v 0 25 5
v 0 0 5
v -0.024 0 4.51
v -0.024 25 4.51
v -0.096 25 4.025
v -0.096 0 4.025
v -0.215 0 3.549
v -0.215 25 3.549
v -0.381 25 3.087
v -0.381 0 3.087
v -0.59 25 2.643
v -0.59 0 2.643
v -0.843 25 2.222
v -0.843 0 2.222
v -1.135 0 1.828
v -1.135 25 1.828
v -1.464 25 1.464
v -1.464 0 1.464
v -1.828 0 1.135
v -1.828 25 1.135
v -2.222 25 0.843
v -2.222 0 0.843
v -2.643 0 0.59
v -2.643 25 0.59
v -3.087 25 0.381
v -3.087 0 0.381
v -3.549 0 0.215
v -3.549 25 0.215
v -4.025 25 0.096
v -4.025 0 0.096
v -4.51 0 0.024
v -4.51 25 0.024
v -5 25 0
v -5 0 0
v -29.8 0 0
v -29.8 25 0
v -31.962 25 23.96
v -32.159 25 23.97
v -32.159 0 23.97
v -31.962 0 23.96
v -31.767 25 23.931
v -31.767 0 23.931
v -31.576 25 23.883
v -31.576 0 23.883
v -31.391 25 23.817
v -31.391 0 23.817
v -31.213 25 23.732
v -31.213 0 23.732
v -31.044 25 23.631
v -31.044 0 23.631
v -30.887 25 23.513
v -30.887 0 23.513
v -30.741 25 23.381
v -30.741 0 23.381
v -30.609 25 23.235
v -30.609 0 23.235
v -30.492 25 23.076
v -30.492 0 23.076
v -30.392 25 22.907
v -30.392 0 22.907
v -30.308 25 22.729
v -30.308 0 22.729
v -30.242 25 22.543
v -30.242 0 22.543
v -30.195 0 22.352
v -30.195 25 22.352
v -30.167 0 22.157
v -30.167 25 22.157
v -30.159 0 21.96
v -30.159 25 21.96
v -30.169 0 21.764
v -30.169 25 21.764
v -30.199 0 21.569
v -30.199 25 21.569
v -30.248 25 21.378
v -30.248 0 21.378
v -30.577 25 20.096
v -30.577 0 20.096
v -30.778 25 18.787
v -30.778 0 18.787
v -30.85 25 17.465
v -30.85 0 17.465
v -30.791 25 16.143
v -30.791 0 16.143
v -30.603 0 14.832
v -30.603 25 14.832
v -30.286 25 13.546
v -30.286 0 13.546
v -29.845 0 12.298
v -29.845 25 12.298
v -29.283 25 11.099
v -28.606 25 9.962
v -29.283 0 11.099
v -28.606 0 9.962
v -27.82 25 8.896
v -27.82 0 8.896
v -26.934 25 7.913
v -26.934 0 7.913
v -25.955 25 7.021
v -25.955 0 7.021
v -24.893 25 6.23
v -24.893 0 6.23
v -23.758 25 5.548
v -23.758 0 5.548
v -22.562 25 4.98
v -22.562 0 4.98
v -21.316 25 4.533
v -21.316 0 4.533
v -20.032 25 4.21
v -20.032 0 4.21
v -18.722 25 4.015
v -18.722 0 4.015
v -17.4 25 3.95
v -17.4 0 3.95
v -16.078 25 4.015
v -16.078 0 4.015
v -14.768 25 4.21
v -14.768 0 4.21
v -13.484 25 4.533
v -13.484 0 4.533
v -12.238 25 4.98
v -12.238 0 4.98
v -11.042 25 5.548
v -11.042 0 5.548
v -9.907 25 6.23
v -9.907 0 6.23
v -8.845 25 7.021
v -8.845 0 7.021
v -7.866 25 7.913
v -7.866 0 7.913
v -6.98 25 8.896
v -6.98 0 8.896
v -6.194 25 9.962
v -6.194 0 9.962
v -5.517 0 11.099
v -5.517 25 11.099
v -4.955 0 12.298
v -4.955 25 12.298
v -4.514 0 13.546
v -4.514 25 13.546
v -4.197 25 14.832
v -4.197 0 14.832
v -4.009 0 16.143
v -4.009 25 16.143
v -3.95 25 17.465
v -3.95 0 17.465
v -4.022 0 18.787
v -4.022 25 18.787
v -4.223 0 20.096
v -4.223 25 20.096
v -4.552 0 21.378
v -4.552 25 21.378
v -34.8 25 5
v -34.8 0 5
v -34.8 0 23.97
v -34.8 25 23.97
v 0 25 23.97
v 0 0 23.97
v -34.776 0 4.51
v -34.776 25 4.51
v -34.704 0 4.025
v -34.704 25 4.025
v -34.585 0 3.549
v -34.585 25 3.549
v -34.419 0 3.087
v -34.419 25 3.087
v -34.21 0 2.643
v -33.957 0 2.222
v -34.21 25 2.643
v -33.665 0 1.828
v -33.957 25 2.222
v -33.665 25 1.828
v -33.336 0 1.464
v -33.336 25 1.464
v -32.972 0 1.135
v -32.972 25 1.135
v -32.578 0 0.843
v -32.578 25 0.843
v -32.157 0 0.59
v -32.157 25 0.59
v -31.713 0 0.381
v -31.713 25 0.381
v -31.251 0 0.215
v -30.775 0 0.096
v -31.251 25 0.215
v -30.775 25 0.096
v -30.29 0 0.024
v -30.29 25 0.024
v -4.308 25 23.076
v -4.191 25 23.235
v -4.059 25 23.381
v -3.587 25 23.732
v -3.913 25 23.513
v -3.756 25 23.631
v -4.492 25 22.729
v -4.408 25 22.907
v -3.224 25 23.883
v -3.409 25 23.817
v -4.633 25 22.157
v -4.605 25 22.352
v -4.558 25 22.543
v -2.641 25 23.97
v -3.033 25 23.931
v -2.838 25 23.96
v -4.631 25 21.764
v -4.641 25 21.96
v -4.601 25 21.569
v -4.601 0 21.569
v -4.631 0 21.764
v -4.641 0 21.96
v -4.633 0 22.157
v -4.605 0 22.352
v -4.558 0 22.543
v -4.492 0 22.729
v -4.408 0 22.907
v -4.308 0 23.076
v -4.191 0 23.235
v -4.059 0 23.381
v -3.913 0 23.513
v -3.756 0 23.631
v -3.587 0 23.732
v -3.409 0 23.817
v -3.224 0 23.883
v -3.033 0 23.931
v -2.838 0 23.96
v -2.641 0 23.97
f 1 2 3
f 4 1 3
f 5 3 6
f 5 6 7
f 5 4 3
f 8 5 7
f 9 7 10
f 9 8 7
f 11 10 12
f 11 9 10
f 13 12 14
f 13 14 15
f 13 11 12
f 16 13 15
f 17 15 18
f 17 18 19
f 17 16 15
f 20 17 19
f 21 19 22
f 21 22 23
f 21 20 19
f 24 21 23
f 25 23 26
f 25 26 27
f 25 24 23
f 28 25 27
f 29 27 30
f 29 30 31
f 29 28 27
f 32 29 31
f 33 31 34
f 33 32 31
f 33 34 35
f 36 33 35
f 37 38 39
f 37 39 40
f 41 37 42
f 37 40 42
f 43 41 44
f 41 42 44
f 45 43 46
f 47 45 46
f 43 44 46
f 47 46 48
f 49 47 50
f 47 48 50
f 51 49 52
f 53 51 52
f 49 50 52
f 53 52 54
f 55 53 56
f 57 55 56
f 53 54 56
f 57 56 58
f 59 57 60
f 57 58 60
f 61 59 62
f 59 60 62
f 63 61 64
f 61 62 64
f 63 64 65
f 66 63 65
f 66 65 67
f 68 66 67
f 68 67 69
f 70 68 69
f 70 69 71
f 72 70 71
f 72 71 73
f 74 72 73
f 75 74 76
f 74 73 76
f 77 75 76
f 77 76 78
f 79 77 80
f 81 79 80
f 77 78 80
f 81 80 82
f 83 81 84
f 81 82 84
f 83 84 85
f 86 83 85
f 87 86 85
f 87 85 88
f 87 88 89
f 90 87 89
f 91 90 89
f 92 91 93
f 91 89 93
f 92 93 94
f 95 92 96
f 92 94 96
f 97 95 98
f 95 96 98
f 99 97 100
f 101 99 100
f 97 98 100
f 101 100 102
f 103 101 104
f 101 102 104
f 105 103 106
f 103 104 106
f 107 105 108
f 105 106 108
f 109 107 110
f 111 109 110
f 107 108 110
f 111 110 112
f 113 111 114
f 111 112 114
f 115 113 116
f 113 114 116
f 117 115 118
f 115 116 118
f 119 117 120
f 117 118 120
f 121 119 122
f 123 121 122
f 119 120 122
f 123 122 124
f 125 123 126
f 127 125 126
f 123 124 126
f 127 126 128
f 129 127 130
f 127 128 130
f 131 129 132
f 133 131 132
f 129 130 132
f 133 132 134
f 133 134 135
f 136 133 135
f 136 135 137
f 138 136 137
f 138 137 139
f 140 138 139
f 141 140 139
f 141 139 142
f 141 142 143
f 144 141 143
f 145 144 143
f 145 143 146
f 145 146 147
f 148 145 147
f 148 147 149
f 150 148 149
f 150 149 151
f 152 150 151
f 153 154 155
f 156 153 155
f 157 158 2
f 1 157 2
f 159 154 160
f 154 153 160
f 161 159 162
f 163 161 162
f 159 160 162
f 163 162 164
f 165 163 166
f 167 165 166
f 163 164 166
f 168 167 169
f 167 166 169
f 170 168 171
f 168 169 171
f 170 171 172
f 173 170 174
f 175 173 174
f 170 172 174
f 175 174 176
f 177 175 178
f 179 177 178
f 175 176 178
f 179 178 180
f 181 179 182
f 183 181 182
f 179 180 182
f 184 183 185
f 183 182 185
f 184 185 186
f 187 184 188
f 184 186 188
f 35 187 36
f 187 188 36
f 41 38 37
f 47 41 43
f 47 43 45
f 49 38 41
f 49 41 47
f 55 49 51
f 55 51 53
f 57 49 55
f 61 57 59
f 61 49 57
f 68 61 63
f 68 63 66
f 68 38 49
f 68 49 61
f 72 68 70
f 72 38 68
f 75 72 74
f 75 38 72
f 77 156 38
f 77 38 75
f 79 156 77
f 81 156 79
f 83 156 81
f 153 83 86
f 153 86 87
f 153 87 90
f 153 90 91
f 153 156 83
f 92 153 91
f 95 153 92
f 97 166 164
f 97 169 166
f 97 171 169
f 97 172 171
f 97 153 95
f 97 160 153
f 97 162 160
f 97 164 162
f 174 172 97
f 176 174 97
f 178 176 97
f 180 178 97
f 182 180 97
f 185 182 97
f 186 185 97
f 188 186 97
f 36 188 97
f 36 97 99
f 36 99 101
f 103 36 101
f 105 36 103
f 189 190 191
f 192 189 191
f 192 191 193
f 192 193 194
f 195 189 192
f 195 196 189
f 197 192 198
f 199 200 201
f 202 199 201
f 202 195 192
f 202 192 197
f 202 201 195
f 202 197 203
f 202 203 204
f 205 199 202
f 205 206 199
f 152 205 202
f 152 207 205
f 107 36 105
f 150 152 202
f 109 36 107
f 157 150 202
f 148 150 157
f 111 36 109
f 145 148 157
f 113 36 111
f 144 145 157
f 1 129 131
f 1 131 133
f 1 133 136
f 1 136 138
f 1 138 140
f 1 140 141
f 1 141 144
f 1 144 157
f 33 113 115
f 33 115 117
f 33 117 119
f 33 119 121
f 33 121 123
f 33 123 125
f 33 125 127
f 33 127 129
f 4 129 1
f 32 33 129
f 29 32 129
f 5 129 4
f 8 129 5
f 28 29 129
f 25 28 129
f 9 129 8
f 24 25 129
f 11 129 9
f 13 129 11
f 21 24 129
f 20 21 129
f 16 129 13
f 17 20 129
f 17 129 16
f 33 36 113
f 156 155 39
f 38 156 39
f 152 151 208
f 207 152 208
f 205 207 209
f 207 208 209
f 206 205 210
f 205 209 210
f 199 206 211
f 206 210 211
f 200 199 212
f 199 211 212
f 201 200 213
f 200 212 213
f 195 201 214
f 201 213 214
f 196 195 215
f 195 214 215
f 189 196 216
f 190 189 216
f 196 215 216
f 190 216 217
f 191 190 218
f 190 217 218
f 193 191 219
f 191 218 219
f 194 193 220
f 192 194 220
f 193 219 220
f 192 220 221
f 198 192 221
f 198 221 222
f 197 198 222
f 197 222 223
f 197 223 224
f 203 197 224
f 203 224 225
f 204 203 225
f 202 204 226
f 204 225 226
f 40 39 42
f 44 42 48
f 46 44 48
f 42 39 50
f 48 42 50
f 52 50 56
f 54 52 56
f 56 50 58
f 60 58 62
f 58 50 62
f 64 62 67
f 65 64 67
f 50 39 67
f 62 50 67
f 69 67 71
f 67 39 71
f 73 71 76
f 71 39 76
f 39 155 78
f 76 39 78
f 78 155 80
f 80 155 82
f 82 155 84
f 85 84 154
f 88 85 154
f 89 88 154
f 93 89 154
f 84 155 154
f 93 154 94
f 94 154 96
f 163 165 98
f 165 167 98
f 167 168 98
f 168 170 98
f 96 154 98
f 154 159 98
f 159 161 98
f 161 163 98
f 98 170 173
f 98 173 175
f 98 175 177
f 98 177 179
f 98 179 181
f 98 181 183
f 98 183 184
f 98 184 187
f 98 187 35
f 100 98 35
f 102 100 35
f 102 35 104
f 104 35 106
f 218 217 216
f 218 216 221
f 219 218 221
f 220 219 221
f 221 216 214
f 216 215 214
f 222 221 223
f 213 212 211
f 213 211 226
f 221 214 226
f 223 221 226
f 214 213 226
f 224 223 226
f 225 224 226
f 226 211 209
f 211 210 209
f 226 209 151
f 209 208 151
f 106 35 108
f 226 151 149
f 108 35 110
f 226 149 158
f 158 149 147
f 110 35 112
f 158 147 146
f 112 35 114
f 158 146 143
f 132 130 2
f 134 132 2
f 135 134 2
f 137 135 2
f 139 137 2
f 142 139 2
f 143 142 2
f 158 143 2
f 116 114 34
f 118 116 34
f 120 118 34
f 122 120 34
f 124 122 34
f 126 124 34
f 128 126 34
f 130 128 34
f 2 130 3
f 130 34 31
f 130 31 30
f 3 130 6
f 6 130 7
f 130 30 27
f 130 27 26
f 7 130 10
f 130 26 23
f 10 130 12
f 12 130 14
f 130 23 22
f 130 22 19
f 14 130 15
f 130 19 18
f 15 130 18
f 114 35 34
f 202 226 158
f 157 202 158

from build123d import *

# Parameters (mm, degrees)
BOSS_EXTRUDE1_DEPTH = 25
FILLET1_R           = 5


with BuildPart() as part:
    # Sketch1 → Boss-Extrude1 (new body)
    with BuildSketch(Plane(origin=(0, 0, 0), x_dir=(1, 0, 0), z_dir=(0, 1, 0))):
        with BuildLine():
            Line((-34.8, 0), (-34.8, -23.97))
            Line((-34.8, -23.97), (-32.158644924, -23.97))
            ThreePointArc((-32.158644924, -23.97), (-30.548804634, -23.156766295), (-30.248140727, -21.378414239))
            ThreePointArc((-30.248140727, -21.378414239), (-17.4, -3.95), (-4.551859273, -21.378414239))
            ThreePointArc((-4.551859273, -21.378414239), (-4.251195366, -23.156766295), (-2.641355076, -23.97))
            Line((-2.641355076, -23.97), (0, -23.97))
            Line((0, -23.97), (0, 0))
            Line((0, 0), (-34.8, 0))
        make_face()
    extrude(amount=BOSS_EXTRUDE1_DEPTH)

    # Fillet1
    fillet1_edges = [part.edges().sort_by_distance(p)[0] for p in [
        (0, 12.5, 0),
        (-34.8, 12.5, 0),
    ]]
    fillet(fillet1_edges, radius=FILLET1_R)


solid = part.part
